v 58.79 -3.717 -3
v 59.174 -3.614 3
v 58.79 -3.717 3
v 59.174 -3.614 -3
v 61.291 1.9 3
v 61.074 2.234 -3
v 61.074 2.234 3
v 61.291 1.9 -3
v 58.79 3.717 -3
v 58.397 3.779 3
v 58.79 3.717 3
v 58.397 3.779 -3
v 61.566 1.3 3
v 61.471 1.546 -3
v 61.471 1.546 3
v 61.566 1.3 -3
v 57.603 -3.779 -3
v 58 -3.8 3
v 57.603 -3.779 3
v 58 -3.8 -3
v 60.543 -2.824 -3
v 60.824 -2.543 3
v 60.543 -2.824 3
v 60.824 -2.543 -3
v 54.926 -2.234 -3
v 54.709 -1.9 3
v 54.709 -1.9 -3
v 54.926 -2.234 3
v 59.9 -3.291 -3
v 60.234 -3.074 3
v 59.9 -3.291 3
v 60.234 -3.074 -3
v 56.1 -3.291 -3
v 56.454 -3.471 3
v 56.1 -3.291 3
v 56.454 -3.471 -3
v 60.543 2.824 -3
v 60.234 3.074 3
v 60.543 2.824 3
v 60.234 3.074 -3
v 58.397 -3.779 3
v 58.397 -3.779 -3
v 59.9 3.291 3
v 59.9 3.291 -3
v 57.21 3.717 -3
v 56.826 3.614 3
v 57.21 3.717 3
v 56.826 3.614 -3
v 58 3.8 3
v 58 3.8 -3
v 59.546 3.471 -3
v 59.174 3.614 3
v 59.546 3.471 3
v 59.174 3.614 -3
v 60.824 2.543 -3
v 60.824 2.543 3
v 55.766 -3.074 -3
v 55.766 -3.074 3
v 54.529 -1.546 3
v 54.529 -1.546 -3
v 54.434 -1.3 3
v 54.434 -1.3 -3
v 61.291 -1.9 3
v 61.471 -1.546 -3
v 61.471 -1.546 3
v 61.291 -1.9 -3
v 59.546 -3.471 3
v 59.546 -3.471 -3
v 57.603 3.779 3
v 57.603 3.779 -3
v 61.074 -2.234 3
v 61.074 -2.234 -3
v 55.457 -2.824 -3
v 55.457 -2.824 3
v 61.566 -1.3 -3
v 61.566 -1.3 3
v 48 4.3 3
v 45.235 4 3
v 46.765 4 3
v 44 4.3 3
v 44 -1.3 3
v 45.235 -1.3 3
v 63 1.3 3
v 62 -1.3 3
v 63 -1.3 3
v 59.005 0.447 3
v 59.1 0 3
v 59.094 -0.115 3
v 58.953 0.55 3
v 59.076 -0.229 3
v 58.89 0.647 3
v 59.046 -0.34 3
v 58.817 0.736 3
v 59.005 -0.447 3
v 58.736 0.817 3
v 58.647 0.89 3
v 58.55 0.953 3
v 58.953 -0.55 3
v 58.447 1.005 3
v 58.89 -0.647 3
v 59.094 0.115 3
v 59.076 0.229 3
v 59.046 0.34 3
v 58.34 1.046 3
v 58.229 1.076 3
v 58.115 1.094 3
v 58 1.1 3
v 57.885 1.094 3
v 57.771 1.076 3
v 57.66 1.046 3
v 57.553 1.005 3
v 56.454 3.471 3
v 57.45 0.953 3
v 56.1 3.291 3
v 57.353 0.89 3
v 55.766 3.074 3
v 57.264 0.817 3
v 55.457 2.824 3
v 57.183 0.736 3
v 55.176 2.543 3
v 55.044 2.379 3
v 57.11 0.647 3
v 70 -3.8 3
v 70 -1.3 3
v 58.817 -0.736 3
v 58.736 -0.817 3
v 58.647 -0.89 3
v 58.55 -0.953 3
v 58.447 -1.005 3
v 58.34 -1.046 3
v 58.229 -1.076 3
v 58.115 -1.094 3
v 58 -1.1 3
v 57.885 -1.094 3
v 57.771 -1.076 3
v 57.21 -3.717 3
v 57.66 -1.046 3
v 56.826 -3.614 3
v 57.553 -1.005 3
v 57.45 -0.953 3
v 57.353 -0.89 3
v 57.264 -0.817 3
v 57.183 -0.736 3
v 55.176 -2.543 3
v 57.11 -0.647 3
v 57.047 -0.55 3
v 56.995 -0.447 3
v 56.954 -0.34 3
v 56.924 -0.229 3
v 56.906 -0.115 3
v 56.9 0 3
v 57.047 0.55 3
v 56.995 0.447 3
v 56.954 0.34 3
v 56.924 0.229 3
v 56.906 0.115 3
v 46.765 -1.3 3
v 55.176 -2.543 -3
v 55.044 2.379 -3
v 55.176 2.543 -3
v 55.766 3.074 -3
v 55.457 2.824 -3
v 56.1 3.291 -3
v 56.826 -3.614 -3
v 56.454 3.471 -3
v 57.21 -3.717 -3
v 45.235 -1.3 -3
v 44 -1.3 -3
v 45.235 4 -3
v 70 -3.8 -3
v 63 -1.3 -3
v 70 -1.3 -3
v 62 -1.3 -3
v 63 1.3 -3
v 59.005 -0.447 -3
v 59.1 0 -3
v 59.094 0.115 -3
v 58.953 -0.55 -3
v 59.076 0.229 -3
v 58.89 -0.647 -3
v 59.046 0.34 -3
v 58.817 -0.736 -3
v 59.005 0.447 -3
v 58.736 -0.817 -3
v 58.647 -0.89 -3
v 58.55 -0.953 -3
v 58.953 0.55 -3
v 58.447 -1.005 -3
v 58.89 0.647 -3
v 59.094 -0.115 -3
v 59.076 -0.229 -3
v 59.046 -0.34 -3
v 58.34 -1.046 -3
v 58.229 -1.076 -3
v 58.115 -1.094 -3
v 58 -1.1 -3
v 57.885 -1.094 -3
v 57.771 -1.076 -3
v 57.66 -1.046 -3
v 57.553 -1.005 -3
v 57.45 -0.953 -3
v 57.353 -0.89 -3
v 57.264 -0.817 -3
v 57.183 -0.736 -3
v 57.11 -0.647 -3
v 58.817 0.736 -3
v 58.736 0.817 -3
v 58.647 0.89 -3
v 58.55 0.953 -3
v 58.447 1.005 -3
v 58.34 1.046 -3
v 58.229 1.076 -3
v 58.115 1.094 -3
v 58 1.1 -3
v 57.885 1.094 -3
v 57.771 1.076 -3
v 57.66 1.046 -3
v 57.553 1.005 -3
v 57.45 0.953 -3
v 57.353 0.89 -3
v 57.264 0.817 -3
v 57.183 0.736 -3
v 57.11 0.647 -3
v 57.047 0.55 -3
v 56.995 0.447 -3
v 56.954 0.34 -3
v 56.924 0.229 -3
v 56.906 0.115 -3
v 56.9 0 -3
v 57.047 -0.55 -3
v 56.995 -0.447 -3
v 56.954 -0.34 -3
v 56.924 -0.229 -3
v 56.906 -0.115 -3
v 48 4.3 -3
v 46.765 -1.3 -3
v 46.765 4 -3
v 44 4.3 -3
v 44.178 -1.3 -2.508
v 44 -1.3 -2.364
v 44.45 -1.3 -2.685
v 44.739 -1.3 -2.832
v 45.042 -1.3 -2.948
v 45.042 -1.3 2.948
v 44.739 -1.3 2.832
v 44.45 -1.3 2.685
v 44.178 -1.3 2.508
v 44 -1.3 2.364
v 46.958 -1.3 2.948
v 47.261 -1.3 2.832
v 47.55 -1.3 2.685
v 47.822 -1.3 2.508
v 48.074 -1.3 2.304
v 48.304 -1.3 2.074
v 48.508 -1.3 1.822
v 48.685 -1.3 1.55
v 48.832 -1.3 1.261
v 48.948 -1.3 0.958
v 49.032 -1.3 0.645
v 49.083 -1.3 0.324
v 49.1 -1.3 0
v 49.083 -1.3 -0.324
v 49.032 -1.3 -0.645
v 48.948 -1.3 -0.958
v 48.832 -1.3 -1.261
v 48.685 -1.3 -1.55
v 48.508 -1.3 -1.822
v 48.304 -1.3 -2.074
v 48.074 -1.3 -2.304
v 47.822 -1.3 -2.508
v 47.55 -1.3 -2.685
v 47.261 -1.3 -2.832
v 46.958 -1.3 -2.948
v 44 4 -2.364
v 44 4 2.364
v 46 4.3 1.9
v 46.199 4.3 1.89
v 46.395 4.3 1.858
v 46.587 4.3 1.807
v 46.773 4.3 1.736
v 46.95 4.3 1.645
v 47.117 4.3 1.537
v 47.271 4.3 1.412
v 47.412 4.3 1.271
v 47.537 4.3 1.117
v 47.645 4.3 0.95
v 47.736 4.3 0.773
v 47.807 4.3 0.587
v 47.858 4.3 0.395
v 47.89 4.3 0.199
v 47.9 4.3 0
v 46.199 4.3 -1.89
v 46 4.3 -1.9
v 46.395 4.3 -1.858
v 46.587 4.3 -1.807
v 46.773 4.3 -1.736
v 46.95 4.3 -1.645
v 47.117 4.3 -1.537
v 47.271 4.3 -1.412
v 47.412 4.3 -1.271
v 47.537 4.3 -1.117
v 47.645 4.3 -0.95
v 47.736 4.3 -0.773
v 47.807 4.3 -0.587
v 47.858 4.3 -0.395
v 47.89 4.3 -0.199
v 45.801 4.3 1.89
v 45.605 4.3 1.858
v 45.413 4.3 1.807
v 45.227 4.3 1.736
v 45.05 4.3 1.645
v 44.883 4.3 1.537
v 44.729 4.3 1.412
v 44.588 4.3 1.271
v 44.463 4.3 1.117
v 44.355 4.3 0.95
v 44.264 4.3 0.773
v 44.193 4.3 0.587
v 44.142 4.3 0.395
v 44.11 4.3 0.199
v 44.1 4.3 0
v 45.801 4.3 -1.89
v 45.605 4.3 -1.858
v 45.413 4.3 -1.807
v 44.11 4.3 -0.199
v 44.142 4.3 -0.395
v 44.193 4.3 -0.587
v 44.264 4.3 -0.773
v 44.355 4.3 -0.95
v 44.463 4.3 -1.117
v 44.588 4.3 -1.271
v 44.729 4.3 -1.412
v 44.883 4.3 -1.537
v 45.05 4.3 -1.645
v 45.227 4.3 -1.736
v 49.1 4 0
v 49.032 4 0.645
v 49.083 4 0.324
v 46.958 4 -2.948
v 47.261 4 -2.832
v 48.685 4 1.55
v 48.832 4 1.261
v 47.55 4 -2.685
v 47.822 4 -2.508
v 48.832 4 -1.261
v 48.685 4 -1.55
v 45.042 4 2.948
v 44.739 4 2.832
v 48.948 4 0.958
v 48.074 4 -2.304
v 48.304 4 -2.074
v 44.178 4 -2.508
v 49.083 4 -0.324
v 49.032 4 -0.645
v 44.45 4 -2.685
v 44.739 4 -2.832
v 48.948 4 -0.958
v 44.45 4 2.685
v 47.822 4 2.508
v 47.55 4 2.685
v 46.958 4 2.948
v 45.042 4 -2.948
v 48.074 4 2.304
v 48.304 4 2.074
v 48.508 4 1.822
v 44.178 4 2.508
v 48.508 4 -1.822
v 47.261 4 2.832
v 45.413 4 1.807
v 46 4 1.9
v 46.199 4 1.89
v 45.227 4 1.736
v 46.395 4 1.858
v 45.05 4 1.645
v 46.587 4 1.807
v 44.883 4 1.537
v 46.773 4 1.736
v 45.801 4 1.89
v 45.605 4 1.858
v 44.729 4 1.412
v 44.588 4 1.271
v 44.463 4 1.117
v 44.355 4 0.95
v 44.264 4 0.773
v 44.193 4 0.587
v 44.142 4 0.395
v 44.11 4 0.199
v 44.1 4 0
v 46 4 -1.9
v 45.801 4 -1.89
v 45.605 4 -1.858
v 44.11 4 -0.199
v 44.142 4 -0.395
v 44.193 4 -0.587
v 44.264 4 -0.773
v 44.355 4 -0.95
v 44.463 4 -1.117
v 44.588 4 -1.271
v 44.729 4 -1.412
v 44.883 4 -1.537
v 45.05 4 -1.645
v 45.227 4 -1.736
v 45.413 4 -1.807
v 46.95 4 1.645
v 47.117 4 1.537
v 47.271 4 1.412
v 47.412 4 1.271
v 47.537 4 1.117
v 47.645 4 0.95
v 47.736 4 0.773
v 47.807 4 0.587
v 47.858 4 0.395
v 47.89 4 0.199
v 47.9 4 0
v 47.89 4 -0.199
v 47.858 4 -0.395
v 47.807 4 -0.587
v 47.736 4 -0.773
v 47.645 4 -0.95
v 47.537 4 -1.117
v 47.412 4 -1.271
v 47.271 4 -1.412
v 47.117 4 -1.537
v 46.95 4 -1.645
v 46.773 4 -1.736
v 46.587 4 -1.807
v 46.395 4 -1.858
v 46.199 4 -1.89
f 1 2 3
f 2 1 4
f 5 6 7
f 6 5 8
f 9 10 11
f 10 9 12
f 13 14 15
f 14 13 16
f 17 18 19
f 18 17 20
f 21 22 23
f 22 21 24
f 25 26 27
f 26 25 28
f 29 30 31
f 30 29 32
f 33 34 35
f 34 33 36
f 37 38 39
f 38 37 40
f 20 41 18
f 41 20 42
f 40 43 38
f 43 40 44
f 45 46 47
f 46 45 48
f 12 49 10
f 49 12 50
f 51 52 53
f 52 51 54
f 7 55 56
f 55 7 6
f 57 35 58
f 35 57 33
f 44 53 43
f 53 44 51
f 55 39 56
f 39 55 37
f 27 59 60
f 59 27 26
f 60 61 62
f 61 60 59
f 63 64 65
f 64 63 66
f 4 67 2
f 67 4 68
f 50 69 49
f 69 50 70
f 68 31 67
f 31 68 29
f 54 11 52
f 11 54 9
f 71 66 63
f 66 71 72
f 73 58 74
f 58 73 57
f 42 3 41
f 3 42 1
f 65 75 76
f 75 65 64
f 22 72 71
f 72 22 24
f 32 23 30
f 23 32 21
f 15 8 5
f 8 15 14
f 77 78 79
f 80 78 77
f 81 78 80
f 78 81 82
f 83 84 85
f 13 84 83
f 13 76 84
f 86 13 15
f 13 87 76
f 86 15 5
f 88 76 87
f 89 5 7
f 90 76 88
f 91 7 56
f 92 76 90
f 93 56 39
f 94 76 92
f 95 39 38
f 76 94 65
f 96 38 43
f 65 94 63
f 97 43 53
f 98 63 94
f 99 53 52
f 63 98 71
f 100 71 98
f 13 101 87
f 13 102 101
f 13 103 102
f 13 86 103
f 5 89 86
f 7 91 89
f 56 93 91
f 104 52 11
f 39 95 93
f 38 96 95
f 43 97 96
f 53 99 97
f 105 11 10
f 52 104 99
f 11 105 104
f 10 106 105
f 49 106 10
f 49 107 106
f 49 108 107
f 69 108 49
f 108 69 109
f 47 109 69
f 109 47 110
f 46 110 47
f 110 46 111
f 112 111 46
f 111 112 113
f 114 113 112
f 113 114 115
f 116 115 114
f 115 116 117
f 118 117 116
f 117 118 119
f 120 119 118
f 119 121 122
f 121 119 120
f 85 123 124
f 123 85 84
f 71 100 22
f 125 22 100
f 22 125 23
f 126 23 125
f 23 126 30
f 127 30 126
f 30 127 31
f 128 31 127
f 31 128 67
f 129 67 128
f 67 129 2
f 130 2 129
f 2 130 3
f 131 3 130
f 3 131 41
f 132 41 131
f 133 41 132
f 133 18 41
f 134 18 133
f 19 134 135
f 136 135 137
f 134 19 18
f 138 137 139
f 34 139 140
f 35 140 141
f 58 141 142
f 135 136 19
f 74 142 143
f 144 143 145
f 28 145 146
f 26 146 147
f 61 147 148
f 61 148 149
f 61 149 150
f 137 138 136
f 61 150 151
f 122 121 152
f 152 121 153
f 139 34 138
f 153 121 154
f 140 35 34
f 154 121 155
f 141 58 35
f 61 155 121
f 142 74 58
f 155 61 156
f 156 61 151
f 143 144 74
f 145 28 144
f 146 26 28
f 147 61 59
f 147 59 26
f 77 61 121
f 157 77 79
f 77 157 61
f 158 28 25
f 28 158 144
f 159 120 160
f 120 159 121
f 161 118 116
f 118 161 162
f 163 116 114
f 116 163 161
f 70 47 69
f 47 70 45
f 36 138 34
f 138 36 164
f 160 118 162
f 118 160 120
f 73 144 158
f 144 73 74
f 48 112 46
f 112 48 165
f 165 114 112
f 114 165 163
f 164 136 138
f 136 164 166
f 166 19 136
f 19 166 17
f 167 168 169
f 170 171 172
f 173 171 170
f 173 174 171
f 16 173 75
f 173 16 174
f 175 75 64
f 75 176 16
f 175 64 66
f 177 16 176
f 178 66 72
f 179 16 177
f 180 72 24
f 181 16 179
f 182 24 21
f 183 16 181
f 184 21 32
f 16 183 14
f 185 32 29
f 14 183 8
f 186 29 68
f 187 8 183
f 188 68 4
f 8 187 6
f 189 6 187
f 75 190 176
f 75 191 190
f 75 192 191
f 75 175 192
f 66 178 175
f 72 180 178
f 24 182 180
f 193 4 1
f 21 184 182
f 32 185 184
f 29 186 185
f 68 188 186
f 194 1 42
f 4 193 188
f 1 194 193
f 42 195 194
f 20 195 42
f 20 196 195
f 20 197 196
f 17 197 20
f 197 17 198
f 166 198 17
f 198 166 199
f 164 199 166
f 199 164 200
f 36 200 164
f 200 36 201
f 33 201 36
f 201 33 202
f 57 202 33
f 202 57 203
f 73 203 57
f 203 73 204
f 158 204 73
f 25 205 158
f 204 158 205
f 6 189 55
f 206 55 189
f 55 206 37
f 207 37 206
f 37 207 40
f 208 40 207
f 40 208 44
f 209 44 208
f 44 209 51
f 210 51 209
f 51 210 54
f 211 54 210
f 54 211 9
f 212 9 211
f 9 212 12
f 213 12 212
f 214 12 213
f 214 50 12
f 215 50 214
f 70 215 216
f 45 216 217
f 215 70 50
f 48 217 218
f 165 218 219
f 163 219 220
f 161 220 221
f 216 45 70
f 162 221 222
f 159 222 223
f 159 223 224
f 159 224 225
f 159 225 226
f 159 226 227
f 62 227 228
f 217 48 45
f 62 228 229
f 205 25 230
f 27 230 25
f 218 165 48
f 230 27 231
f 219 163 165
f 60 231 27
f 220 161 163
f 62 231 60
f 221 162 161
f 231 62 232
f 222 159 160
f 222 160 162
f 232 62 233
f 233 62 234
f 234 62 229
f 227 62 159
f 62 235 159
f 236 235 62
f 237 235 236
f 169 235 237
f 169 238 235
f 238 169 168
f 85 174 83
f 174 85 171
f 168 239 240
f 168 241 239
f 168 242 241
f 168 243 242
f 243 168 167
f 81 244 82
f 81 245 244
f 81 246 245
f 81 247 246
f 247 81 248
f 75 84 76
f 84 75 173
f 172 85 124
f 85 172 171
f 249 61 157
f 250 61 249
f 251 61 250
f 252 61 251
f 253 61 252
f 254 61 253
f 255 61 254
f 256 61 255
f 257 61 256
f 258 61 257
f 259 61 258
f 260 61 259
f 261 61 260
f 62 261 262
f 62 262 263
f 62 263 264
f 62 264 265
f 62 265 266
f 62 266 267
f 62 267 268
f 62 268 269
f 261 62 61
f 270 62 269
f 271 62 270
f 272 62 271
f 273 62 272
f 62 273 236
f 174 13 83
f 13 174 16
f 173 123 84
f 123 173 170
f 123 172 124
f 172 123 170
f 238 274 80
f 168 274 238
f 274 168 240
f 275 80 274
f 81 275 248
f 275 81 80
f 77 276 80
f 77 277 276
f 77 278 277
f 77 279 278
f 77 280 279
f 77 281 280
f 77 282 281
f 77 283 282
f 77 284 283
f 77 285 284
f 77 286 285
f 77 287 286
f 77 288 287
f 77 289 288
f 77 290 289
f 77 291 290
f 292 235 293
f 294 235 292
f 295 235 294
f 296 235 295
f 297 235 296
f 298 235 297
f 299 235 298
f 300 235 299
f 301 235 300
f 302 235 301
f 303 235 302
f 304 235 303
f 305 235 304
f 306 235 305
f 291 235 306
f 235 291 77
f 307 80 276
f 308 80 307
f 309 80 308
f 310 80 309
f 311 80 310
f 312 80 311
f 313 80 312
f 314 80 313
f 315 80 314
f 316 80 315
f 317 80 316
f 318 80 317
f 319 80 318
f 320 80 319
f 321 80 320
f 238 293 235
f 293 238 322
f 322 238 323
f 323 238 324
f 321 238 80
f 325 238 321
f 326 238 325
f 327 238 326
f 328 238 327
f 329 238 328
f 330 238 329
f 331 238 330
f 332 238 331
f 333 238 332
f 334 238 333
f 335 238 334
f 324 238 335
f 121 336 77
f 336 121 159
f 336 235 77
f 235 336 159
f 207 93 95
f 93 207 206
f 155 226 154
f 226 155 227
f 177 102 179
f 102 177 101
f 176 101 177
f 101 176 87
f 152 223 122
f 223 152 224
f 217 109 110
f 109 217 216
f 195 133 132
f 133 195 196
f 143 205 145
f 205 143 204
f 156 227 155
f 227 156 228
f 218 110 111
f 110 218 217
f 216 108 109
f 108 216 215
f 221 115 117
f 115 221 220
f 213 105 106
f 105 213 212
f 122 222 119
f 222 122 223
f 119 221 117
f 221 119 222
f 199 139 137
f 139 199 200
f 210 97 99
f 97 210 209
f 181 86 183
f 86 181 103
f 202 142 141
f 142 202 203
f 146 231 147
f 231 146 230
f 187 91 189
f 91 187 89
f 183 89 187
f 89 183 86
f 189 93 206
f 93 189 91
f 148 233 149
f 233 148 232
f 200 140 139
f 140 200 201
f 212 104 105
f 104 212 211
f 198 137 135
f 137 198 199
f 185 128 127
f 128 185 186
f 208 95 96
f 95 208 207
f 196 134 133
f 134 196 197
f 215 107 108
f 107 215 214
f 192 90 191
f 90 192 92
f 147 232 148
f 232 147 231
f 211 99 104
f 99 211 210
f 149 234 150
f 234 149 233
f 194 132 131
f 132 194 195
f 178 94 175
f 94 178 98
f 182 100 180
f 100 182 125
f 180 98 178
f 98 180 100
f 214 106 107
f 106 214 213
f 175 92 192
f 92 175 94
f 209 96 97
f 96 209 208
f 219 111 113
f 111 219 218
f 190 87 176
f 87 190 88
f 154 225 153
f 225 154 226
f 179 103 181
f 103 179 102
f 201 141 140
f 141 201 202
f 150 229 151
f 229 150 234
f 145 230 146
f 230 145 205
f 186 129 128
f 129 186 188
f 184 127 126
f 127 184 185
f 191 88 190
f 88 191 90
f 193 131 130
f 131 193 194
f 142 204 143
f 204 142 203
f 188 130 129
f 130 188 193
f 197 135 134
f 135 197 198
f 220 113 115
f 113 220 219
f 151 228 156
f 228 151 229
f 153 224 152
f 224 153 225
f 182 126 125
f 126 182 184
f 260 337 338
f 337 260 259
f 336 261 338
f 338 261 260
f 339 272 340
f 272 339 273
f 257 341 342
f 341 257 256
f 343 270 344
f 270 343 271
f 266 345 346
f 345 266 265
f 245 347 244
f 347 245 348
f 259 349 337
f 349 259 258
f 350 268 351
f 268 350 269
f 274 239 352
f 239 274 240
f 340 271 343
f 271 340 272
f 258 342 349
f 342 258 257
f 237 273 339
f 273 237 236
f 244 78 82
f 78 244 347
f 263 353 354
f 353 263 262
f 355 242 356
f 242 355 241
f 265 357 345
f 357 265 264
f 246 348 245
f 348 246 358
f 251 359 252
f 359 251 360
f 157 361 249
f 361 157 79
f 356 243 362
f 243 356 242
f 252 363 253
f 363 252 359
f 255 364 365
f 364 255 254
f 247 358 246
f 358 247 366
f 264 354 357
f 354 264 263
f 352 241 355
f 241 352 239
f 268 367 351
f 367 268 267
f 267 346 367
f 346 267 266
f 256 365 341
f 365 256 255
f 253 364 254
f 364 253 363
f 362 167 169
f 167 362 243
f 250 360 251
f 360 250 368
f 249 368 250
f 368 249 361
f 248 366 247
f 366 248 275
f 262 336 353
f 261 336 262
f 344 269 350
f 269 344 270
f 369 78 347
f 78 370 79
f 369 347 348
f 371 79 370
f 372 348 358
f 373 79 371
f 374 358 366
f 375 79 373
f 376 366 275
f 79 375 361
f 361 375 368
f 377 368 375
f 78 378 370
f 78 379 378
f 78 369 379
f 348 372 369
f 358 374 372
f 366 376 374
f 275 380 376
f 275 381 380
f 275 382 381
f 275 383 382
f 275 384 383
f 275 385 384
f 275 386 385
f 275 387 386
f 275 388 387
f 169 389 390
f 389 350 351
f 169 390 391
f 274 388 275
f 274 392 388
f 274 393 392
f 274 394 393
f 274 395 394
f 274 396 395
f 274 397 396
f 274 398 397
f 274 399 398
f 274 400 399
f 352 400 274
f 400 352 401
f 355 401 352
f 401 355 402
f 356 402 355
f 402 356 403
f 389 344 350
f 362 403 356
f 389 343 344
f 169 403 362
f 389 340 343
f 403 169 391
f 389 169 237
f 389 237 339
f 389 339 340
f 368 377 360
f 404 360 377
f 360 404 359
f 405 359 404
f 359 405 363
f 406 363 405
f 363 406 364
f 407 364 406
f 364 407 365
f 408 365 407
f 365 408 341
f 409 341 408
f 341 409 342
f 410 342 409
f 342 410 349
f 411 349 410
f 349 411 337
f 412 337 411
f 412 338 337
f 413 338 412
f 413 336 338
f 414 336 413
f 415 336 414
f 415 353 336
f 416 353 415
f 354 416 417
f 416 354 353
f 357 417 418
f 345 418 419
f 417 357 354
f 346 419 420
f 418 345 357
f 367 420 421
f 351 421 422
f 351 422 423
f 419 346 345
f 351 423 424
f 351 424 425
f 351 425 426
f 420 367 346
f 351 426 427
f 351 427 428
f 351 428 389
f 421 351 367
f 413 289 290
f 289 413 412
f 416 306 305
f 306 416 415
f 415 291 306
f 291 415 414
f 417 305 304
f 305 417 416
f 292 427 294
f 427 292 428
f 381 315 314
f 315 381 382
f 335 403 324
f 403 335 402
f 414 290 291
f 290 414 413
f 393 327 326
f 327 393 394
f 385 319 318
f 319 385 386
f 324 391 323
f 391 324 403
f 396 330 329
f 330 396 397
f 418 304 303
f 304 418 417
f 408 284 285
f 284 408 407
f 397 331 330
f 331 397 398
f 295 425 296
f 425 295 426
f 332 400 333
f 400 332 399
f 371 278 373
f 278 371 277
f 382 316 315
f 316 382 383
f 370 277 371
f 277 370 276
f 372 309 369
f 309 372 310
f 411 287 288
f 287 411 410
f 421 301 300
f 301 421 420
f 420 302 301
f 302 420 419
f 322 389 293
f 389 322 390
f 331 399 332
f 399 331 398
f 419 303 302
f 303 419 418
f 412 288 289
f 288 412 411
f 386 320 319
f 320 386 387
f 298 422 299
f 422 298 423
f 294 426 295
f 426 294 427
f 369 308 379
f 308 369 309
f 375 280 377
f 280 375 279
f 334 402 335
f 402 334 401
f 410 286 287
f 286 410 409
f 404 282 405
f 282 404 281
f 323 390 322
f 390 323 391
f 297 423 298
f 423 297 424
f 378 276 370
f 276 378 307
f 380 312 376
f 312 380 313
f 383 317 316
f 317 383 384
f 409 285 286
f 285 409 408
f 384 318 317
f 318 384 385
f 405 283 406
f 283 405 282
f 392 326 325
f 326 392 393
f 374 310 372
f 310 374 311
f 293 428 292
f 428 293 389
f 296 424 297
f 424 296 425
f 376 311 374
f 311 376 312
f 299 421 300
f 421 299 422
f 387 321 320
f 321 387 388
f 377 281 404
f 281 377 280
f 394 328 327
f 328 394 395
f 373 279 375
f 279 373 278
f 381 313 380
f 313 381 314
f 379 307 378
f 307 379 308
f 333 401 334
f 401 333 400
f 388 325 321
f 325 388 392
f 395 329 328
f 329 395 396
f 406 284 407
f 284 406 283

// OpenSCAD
// file: ../../00_common/parameters.scad
// =============================================================================
// OpenMotorBridge - Global CAD Parameters & Settings
// =============================================================================
// File: hardware/cad/scad/00_common/parameters.scad
// Description: Global dimensional constants, manufacturing clearances and
//              circle resolution ($fn) for all OpenSCAD modules.
// =============================================================================

// --- 1. Circle & Curve Resolution ---
$fn = 60; // Smooth cylinders and holes for high-quality MJF 3D printing

// --- 2. Central Main Box Dimensions (3-Tier Sandwich) ---
MAIN_BOX_OUTER_L      = 110.0; // Outer length in X (mm)
MAIN_BOX_OUTER_W      = 74.0;  // Outer width in Y (mm)
MAIN_BOX_LOWER_H      = 17.0;  // Lower case height in Z (mm)
MAIN_BOX_MID_H        = 15.0;  // Mid tray height in Z (mm)
MAIN_BOX_LID_H        = 4.0;   // Lid plate thickness in Z (mm)
MAIN_BOX_WALL         = 2.5;   // Nominal wall thickness (mm)
MAIN_BOX_CORNER_POST  = 5.0;   // Corner clamping screw post size (mm)

// --- 3. Satellite Pod Dimensions (Universal Enlarged Envelope) ---
POD_OUTER_L           = 135.0; // Outer length in X (mm)
POD_OUTER_W           = 70.0;  // Outer width in Y (mm)
POD_OUTER_H           = 38.0;  // Outer height in Z (mm)
POD_WALL              = 3.5;   // Nominal wall thickness (mm)
POD_BULKHEAD_X        = 18.0;  // Partition bulkhead position in X (mm)
POD_CHAMBER_L         = 117.0; // Sliding chamber length in X (mm)
POD_CHAMBER_W         = 63.0;  // Sliding chamber width in Y (mm)
POD_CHAMBER_H         = 31.0;  // Sliding chamber height in Z (mm)

// --- 4. Pod Linear Guide Rails (Poka-Yoke Tongue & Groove) ---
POD_GROOVE_W          = 3.0;   // Internal guide groove width in Z (mm)
POD_GROOVE_DEPTH      = 1.5;   // Internal guide groove depth in Y (mm)
POD_GROOVE_LEFT_Z     = 10.0;  // Center height of left groove (mm)
POD_GROOVE_RIGHT_Z    = 18.0;  // Center height of right groove (mm, asym offset)

CARTRIDGE_TONGUE_W    = 2.6;   // Cartridge tongue rail height in Z (mm, 0.2mm clearance)
CARTRIDGE_TONGUE_PROT = 1.4;   // Cartridge tongue protrusion in Y (mm, 0.1mm clearance)
CARTRIDGE_CHAMFER_L   = 4.0;   // 30° lead-in chamfer nose length (mm)

// --- 5. Cartridge Dimensions (Enlarged Universal Sled) ---
CARTRIDGE_BASE_L      = 116.0; // Sled length in X (mm)
CARTRIDGE_BASE_W      = 58.0;  // Sled width in Y (mm)
CARTRIDGE_BASE_H      = 28.0;  // Sled height in Z (mm)
CARTRIDGE_FACE_L      = 4.0;   // Front faceplate thickness in X (mm)
CARTRIDGE_FACE_W      = 64.0;  // Front faceplate width in Y (mm)
CARTRIDGE_FACE_H      = 34.0;  // Front faceplate height in Z (mm)

// --- 5a. RF Interface & Sealing Dimensions ---
SMA_BORE_R            = 3.25;  // Ø 6.5 mm through-hole for standard SMA bulkhead
SMA_ORECESS_R         = 4.75;  // Ø 9.5 mm recess for waterproof silicone O-ring
SMA_ORECESS_DEPTH     = 1.2;   // 1.2 mm deep O-ring compression pocket

// --- 5b. Magnetic Anti-Theft Lock System ---
LATCH_PIVOT_X         = 58.0;  // Center pivot position along sled X (mm)
LATCH_MAGNET_X        = 46.0;  // Ferromagnetic anchor position along sled X (mm)
LATCH_TOOTH_X         = 70.0;  // Locking sawtooth pawl position along sled X (mm)
LATCH_ARM_H           = 6.0;   // Rocker lever height in Z (mm)
LATCH_ARM_THICK       = 2.6;   // Rocker beam thickness in Y (mm)
LATCH_MAGNET_PIN_DIA  = 6.2;   // Bore for Ø 6.0 mm steel dowel pin (mm)
LATCH_SPRING_DIA      = 3.8;   // Bore for Ø 3.5 mm return compression spring (mm)

// --- 6. Thermal Copper Studs (Kühlbolzen) ---
COPPER_STUD_DIA       = 8.0;   // Diameter of thermal copper studs (mm)
COPPER_STUD_R         = COPPER_STUD_DIA / 2.0; // Radius = 4.0 mm

// Main Box Thermal Stud Positions (4x in lower case floor)
MAIN_BOX_CU_POS = [
    [35.0, 25.0], // Position 1 (LM5164 DCDC Buck Regulator)
    [45.0, 25.0], // Position 2 (BQ25798 LiPo Charger)
    [30.0, 48.0], // Position 3 (ESP32-S3 Dual-Core SoC)
    [70.0, 40.0]  // Position 4 (Automotive TVS & LC Filter Zone)
];

// Pod & Cartridge Thermal Stud Positions (2x in floor)
POD_CU_POS = [
    [42.0, 30.0], // Forward thermal zone
    [72.0, 30.0]  // Rearward thermal zone
];

// --- 7. Screw & Clearance Dimensions ---
M2_SCREW_HOLE_R       = 1.1;   // M2 clearance hole (r = 1.1 mm -> Ø 2.2 mm)
M2_5_SCREW_HOLE_R     = 1.4;   // M2.5 clearance hole (r = 1.4 mm -> Ø 2.8 mm)
M3_SCREW_HOLE_R       = 1.65;  // M3 clearance hole (r = 1.65 mm -> Ø 3.3 mm)
M4_SCREW_HOLE_R       = 2.2;   // M4 clearance hole (r = 2.2 mm -> Ø 4.4 mm)
M8_BORE_R             = 4.0;   // M8 cable through-bore (r = 4.0 mm -> Ø 8.0 mm)
M8_STUDS_OUTER_R      = 6.0;   // M8 neck outer radius (Ø 12.0 mm)

// --- 8. Universal Front Node Enclosure Dimensions ---
FRONT_NODE_PCB_L      = 68.0;  // PCB length in X (mm)
FRONT_NODE_PCB_W      = 44.0;  // PCB width in Y (mm)
FRONT_NODE_PCB_H      = 1.6;   // PCB thickness in Z (mm)
FRONT_NODE_PCB_R      = 2.5;   // PCB corner radius (mm)

FRONT_NODE_CHAMBER_L  = 72.0;  // Internal chamber length in X (mm, 2mm margin)
FRONT_NODE_CHAMBER_W  = 48.0;  // Internal chamber width in Y (mm, 2mm margin)
FRONT_NODE_TUB_H      = 16.0;  // Lower tub depth in Z (mm)
FRONT_NODE_LID_H      = 7.0;   // Upper lid height in Z (mm)
FRONT_NODE_WALL       = 2.5;   // Wall thickness in HP MJF PA12 (mm)
FRONT_NODE_CORNER_R   = 4.0;   // Outer enclosure corner radius (mm)

FRONT_NODE_OUTER_L    = FRONT_NODE_CHAMBER_L + 2 * FRONT_NODE_WALL + 7.0; // 84.0 mm
FRONT_NODE_OUTER_W    = FRONT_NODE_CHAMBER_W + 2 * FRONT_NODE_WALL + 7.0; // 60.0 mm
FRONT_NODE_OUTER_H    = FRONT_NODE_TUB_H + FRONT_NODE_LID_H;              // 23.0 mm

// PCB Standoff Heights & Radii
FRONT_NODE_STANDOFF_H = 3.0;   // Height of PCB standoffs from floor (mm)
FRONT_NODE_STANDOFF_R = 3.0;   // Outer radius of M2.5 screw bosses (mm)
FRONT_NODE_INSERT_R   = 1.7;   // Core hole for Ruthex M2.5 heat-set inserts (Ø 3.4 mm)

// AMPS 4-Hole Mounting Pattern (38 x 30 mm, M4 threaded inserts)
AMPS_SPACING_X        = 38.0;  // AMPS hole distance in X (mm)
AMPS_SPACING_Y        = 30.0;  // AMPS hole distance in Y (mm)
AMPS_INSERT_R         = 2.3;   // Core hole for Ruthex M4 heat-set inserts (Ø 4.6 mm)

// Acoustic Vent for Knowles SPH0645 MEMS
FRONT_NODE_MIC_HOLE_R = 1.25;  // Sound canal radius (Ø 2.5 mm)
FRONT_NODE_MIC_MEMB_R = 3.0;   // Gore ePTFE membrane pocket radius (Ø 6.0 mm)
FRONT_NODE_MIC_MEMB_D = 0.8;   // Membrane pocket depth (mm)
// main file
// =============================================================================
// OpenMotorBridge - Magnetic Anti-Theft Lock Latch (Magnetischer Diebstahlschutz)
// =============================================================================
// File: hardware/cad/scad/03_pod_cartridges/parts/05_magnetic_lock_latch.scad
// Description: Spring-loaded, magnet-actuated anti-theft rocker pawl module
//              for OpenMotorBridge universal cartridges (Sena, Cardo, Transceiver).
//              Wirkprinzip: 1. Klasse 2-Arm-Wippe mit Drehpunkt in der Mitte:
//              - Hinterer Arm (X = 46 mm): Hält den ferromagnetischen Stahlanker (Ø 6 mm).
//              - Drehpunkt (X = 58 mm): M2 Edelstahl-Schwenkachse.
//              - Vorderer Arm (X = 70 mm): Sägezahn-Rastkralle mit 30° Einschubschräge
//                und 90° Sperrflanke gegen Herausziehen.
//              - Druckfeder drückt den hinteren Arm nach innen -> vorderer Zahn schnappt nach außen.
//              - Externer N52 Neodym-Magnet zieht den hinteren Arm nach außen ->
//                vorderer Zahn schwenkt nach innen -> Kassette entriegelt & federt aus!
// =============================================================================

include <../../00_common/parameters.scad>;

// --- Parametric Dimensions ---
LATCH_PIVOT_X       = 58.0;  // Center pivot position in sled X (mm)
LATCH_MAGNET_X      = 46.0;  // Ferromagnetic anchor position in sled X (mm)
LATCH_TOOTH_X       = 70.0;  // Locking sawtooth pawl position in sled X (mm)

LATCH_ARM_H         = 6.0;   // Rocker lever height in Z (mm)
LATCH_ARM_THICK     = 2.6;   // Rocker beam thickness in Y (mm)
LATCH_PIVOT_BORE_R  = 1.1;   // M2 pivot bore radius (Ø 2.2 mm)

// Sawtooth wedge pawl geometry
PAWL_PROTRUSION_Y   = 2.5;   // Locking pawl reach beyond guide rail (mm)
PAWL_LENGTH_X       = 8.0;   // Pawl tooth length along X (mm)
PAWL_RAMP_ANGLE     = 30.0;  // 30° lead-in ramp for smooth insertion

// Internal magnetic anchor & spring cavities
MAGNET_PIN_DIA      = 6.2;   // Bore for Ø 6.0 mm steel dowel pin (mm)
MAGNET_PIN_R        = MAGNET_PIN_DIA / 2.0;
MAGNET_PIN_L        = 8.0;   // Length of steel core (mm)
SPRING_BORE_DIA     = 3.8;   // Bore for Ø 3.5 mm return compression spring (mm)
SPRING_BORE_R       = SPRING_BORE_DIA / 2.0;
SPRING_BORE_DEPTH   = 6.0;   // Spring pocket depth (mm)

// 1. The 3D-Printable Rocker Lever (Die Verriegelungswippe)
module magnetic_lock_rocker_lever() {
    difference() {
        union() {
            // Central pivot cylinder
            translate([LATCH_PIVOT_X, 0, 0])
                cylinder(r=3.8, h=LATCH_ARM_H, center=true);

            // Forward locking arm
            hull() {
                translate([LATCH_PIVOT_X, -LATCH_ARM_THICK/2.0, -LATCH_ARM_H/2.0])
                    cube([1.0, LATCH_ARM_THICK, LATCH_ARM_H]);
                translate([LATCH_TOOTH_X - PAWL_LENGTH_X, -LATCH_ARM_THICK/2.0, -LATCH_ARM_H/2.0])
                    cube([1.0, LATCH_ARM_THICK, LATCH_ARM_H]);
            }

            // Forward Sawtooth Locking Tooth (30° slope facing rear, 90° stop facing forward)
            translate([LATCH_TOOTH_X - PAWL_LENGTH_X, -LATCH_ARM_THICK/2.0 - PAWL_PROTRUSION_Y, -LATCH_ARM_H/2.0]) {
                polyhedron(
                    points=[
                        [0, PAWL_PROTRUSION_Y, 0],
                        [PAWL_LENGTH_X, PAWL_PROTRUSION_Y, 0],
                        [PAWL_LENGTH_X, 0, 0],
                        [0, PAWL_PROTRUSION_Y, LATCH_ARM_H],
                        [PAWL_LENGTH_X, PAWL_PROTRUSION_Y, LATCH_ARM_H],
                        [PAWL_LENGTH_X, 0, LATCH_ARM_H]
                    ],
                    faces=[
                        [0,1,2], [3,5,4], [0,2,5,3], [1,4,5,2], [0,3,4,1]
                    ]
                );
            }

            // Rearward magnetic anchor arm
            hull() {
                translate([LATCH_PIVOT_X, -LATCH_ARM_THICK/2.0, -LATCH_ARM_H/2.0])
                    cube([1.0, LATCH_ARM_THICK, LATCH_ARM_H]);
                translate([LATCH_MAGNET_X - 2.0, -LATCH_ARM_THICK/2.0, -LATCH_ARM_H/2.0])
                    cube([4.0, LATCH_ARM_THICK + 3.0, LATCH_ARM_H]);
            }
        }

        // M2 Center Pivot Through-Bore
        translate([LATCH_PIVOT_X, 0, -LATCH_ARM_H/2.0 - 1.0])
            cylinder(r=LATCH_PIVOT_BORE_R, h=LATCH_ARM_H + 2.0);

        // Ferromagnetic Steel Pin Pocket (in rear arm)
        translate([LATCH_MAGNET_X, 0, 0])
            rotate([90, 0, 0])
                cylinder(r=MAGNET_PIN_R, h=MAGNET_PIN_L, center=true);

        // Return Spring Pocket (on inner face of rear arm)
        translate([LATCH_MAGNET_X, 2.0, 0])
            rotate([-90, 0, 0])
                cylinder(r=SPRING_BORE_R, h=SPRING_BORE_DEPTH + 1.0);
    }
}

// 2. Boolean Cutout Tool for Cartridge Base Sled (Erzeugt Schwenktasche & M2 Schraubdom)
module magnetic_lock_sled_pocket_tool(wall=2.5, z_center=POD_GROOVE_LEFT_Z) {
    // Rocker Swing Cavity
    translate([LATCH_MAGNET_X - 6.0, -1.0, z_center - LATCH_ARM_H/2.0 - 0.8])
        cube([LATCH_TOOTH_X - LATCH_MAGNET_X + 12.0, wall + 4.5, LATCH_ARM_H + 1.6]);

    // Outer Slot in Guide Tongue for Tooth Protrusion
    translate([LATCH_TOOTH_X - PAWL_LENGTH_X - 1.0, -CARTRIDGE_TONGUE_PROT - 1.0, z_center - LATCH_ARM_H/2.0 - 0.5])
        cube([PAWL_LENGTH_X + 2.0, CARTRIDGE_TONGUE_PROT + 2.0, LATCH_ARM_H + 1.0]);

    // M2 Pivot Standoff / Screw Boss
    translate([LATCH_PIVOT_X, wall + 1.5, z_center])
        cylinder(r=LATCH_PIVOT_BORE_R, h=15.0, center=true);
}

// 3. Boolean Cutout Tool for Pod Base Housing Detent (Rastkerbe im Führungsnut-Grund)
module magnetic_lock_housing_detent_tool(wall=POD_WALL, z_center=POD_GROOVE_LEFT_Z) {
    detent_x_pos = POD_BULKHEAD_X + LATCH_TOOTH_X; // X in housing = 18 + 70 = 88 mm
    // Locking Detent Pocket in Left Guide Groove
    translate([detent_x_pos - PAWL_LENGTH_X - 1.0, wall - 1.5, z_center - LATCH_ARM_H/2.0 - 0.6]) {
        // Sharp 90° blocking shoulder at rear (preventing pull-out)
        cube([PAWL_LENGTH_X + 2.0, 2.5, LATCH_ARM_H + 1.2]);
    }
}

// 4. Boolean Tool for Housing Exterior Magnet Alignment Indicator (Zielkreis)
module magnetic_lock_housing_target_tool(wall=POD_WALL, z_center=POD_GROOVE_LEFT_Z) {
    target_x_pos = POD_BULKHEAD_X + LATCH_MAGNET_X; // X in housing = 18 + 46 = 64 mm
    // Outer Debossed Target Circle for Neodymium Key
    translate([target_x_pos, -0.1, z_center]) {
        rotate([90, 0, 0]) {
            // Outer alignment ring (Ø 18 mm x 0.6 mm deep)
            difference() {
                cylinder(r=9.0, h=0.6, center=false);
                cylinder(r=7.5, h=0.7, center=false);
            }
            // Center tactile alignment pip
            cylinder(r=2.5, h=0.6, center=false);
        }
    }
}

// Standalone render of the rocker lever
magnetic_lock_rocker_lever();
